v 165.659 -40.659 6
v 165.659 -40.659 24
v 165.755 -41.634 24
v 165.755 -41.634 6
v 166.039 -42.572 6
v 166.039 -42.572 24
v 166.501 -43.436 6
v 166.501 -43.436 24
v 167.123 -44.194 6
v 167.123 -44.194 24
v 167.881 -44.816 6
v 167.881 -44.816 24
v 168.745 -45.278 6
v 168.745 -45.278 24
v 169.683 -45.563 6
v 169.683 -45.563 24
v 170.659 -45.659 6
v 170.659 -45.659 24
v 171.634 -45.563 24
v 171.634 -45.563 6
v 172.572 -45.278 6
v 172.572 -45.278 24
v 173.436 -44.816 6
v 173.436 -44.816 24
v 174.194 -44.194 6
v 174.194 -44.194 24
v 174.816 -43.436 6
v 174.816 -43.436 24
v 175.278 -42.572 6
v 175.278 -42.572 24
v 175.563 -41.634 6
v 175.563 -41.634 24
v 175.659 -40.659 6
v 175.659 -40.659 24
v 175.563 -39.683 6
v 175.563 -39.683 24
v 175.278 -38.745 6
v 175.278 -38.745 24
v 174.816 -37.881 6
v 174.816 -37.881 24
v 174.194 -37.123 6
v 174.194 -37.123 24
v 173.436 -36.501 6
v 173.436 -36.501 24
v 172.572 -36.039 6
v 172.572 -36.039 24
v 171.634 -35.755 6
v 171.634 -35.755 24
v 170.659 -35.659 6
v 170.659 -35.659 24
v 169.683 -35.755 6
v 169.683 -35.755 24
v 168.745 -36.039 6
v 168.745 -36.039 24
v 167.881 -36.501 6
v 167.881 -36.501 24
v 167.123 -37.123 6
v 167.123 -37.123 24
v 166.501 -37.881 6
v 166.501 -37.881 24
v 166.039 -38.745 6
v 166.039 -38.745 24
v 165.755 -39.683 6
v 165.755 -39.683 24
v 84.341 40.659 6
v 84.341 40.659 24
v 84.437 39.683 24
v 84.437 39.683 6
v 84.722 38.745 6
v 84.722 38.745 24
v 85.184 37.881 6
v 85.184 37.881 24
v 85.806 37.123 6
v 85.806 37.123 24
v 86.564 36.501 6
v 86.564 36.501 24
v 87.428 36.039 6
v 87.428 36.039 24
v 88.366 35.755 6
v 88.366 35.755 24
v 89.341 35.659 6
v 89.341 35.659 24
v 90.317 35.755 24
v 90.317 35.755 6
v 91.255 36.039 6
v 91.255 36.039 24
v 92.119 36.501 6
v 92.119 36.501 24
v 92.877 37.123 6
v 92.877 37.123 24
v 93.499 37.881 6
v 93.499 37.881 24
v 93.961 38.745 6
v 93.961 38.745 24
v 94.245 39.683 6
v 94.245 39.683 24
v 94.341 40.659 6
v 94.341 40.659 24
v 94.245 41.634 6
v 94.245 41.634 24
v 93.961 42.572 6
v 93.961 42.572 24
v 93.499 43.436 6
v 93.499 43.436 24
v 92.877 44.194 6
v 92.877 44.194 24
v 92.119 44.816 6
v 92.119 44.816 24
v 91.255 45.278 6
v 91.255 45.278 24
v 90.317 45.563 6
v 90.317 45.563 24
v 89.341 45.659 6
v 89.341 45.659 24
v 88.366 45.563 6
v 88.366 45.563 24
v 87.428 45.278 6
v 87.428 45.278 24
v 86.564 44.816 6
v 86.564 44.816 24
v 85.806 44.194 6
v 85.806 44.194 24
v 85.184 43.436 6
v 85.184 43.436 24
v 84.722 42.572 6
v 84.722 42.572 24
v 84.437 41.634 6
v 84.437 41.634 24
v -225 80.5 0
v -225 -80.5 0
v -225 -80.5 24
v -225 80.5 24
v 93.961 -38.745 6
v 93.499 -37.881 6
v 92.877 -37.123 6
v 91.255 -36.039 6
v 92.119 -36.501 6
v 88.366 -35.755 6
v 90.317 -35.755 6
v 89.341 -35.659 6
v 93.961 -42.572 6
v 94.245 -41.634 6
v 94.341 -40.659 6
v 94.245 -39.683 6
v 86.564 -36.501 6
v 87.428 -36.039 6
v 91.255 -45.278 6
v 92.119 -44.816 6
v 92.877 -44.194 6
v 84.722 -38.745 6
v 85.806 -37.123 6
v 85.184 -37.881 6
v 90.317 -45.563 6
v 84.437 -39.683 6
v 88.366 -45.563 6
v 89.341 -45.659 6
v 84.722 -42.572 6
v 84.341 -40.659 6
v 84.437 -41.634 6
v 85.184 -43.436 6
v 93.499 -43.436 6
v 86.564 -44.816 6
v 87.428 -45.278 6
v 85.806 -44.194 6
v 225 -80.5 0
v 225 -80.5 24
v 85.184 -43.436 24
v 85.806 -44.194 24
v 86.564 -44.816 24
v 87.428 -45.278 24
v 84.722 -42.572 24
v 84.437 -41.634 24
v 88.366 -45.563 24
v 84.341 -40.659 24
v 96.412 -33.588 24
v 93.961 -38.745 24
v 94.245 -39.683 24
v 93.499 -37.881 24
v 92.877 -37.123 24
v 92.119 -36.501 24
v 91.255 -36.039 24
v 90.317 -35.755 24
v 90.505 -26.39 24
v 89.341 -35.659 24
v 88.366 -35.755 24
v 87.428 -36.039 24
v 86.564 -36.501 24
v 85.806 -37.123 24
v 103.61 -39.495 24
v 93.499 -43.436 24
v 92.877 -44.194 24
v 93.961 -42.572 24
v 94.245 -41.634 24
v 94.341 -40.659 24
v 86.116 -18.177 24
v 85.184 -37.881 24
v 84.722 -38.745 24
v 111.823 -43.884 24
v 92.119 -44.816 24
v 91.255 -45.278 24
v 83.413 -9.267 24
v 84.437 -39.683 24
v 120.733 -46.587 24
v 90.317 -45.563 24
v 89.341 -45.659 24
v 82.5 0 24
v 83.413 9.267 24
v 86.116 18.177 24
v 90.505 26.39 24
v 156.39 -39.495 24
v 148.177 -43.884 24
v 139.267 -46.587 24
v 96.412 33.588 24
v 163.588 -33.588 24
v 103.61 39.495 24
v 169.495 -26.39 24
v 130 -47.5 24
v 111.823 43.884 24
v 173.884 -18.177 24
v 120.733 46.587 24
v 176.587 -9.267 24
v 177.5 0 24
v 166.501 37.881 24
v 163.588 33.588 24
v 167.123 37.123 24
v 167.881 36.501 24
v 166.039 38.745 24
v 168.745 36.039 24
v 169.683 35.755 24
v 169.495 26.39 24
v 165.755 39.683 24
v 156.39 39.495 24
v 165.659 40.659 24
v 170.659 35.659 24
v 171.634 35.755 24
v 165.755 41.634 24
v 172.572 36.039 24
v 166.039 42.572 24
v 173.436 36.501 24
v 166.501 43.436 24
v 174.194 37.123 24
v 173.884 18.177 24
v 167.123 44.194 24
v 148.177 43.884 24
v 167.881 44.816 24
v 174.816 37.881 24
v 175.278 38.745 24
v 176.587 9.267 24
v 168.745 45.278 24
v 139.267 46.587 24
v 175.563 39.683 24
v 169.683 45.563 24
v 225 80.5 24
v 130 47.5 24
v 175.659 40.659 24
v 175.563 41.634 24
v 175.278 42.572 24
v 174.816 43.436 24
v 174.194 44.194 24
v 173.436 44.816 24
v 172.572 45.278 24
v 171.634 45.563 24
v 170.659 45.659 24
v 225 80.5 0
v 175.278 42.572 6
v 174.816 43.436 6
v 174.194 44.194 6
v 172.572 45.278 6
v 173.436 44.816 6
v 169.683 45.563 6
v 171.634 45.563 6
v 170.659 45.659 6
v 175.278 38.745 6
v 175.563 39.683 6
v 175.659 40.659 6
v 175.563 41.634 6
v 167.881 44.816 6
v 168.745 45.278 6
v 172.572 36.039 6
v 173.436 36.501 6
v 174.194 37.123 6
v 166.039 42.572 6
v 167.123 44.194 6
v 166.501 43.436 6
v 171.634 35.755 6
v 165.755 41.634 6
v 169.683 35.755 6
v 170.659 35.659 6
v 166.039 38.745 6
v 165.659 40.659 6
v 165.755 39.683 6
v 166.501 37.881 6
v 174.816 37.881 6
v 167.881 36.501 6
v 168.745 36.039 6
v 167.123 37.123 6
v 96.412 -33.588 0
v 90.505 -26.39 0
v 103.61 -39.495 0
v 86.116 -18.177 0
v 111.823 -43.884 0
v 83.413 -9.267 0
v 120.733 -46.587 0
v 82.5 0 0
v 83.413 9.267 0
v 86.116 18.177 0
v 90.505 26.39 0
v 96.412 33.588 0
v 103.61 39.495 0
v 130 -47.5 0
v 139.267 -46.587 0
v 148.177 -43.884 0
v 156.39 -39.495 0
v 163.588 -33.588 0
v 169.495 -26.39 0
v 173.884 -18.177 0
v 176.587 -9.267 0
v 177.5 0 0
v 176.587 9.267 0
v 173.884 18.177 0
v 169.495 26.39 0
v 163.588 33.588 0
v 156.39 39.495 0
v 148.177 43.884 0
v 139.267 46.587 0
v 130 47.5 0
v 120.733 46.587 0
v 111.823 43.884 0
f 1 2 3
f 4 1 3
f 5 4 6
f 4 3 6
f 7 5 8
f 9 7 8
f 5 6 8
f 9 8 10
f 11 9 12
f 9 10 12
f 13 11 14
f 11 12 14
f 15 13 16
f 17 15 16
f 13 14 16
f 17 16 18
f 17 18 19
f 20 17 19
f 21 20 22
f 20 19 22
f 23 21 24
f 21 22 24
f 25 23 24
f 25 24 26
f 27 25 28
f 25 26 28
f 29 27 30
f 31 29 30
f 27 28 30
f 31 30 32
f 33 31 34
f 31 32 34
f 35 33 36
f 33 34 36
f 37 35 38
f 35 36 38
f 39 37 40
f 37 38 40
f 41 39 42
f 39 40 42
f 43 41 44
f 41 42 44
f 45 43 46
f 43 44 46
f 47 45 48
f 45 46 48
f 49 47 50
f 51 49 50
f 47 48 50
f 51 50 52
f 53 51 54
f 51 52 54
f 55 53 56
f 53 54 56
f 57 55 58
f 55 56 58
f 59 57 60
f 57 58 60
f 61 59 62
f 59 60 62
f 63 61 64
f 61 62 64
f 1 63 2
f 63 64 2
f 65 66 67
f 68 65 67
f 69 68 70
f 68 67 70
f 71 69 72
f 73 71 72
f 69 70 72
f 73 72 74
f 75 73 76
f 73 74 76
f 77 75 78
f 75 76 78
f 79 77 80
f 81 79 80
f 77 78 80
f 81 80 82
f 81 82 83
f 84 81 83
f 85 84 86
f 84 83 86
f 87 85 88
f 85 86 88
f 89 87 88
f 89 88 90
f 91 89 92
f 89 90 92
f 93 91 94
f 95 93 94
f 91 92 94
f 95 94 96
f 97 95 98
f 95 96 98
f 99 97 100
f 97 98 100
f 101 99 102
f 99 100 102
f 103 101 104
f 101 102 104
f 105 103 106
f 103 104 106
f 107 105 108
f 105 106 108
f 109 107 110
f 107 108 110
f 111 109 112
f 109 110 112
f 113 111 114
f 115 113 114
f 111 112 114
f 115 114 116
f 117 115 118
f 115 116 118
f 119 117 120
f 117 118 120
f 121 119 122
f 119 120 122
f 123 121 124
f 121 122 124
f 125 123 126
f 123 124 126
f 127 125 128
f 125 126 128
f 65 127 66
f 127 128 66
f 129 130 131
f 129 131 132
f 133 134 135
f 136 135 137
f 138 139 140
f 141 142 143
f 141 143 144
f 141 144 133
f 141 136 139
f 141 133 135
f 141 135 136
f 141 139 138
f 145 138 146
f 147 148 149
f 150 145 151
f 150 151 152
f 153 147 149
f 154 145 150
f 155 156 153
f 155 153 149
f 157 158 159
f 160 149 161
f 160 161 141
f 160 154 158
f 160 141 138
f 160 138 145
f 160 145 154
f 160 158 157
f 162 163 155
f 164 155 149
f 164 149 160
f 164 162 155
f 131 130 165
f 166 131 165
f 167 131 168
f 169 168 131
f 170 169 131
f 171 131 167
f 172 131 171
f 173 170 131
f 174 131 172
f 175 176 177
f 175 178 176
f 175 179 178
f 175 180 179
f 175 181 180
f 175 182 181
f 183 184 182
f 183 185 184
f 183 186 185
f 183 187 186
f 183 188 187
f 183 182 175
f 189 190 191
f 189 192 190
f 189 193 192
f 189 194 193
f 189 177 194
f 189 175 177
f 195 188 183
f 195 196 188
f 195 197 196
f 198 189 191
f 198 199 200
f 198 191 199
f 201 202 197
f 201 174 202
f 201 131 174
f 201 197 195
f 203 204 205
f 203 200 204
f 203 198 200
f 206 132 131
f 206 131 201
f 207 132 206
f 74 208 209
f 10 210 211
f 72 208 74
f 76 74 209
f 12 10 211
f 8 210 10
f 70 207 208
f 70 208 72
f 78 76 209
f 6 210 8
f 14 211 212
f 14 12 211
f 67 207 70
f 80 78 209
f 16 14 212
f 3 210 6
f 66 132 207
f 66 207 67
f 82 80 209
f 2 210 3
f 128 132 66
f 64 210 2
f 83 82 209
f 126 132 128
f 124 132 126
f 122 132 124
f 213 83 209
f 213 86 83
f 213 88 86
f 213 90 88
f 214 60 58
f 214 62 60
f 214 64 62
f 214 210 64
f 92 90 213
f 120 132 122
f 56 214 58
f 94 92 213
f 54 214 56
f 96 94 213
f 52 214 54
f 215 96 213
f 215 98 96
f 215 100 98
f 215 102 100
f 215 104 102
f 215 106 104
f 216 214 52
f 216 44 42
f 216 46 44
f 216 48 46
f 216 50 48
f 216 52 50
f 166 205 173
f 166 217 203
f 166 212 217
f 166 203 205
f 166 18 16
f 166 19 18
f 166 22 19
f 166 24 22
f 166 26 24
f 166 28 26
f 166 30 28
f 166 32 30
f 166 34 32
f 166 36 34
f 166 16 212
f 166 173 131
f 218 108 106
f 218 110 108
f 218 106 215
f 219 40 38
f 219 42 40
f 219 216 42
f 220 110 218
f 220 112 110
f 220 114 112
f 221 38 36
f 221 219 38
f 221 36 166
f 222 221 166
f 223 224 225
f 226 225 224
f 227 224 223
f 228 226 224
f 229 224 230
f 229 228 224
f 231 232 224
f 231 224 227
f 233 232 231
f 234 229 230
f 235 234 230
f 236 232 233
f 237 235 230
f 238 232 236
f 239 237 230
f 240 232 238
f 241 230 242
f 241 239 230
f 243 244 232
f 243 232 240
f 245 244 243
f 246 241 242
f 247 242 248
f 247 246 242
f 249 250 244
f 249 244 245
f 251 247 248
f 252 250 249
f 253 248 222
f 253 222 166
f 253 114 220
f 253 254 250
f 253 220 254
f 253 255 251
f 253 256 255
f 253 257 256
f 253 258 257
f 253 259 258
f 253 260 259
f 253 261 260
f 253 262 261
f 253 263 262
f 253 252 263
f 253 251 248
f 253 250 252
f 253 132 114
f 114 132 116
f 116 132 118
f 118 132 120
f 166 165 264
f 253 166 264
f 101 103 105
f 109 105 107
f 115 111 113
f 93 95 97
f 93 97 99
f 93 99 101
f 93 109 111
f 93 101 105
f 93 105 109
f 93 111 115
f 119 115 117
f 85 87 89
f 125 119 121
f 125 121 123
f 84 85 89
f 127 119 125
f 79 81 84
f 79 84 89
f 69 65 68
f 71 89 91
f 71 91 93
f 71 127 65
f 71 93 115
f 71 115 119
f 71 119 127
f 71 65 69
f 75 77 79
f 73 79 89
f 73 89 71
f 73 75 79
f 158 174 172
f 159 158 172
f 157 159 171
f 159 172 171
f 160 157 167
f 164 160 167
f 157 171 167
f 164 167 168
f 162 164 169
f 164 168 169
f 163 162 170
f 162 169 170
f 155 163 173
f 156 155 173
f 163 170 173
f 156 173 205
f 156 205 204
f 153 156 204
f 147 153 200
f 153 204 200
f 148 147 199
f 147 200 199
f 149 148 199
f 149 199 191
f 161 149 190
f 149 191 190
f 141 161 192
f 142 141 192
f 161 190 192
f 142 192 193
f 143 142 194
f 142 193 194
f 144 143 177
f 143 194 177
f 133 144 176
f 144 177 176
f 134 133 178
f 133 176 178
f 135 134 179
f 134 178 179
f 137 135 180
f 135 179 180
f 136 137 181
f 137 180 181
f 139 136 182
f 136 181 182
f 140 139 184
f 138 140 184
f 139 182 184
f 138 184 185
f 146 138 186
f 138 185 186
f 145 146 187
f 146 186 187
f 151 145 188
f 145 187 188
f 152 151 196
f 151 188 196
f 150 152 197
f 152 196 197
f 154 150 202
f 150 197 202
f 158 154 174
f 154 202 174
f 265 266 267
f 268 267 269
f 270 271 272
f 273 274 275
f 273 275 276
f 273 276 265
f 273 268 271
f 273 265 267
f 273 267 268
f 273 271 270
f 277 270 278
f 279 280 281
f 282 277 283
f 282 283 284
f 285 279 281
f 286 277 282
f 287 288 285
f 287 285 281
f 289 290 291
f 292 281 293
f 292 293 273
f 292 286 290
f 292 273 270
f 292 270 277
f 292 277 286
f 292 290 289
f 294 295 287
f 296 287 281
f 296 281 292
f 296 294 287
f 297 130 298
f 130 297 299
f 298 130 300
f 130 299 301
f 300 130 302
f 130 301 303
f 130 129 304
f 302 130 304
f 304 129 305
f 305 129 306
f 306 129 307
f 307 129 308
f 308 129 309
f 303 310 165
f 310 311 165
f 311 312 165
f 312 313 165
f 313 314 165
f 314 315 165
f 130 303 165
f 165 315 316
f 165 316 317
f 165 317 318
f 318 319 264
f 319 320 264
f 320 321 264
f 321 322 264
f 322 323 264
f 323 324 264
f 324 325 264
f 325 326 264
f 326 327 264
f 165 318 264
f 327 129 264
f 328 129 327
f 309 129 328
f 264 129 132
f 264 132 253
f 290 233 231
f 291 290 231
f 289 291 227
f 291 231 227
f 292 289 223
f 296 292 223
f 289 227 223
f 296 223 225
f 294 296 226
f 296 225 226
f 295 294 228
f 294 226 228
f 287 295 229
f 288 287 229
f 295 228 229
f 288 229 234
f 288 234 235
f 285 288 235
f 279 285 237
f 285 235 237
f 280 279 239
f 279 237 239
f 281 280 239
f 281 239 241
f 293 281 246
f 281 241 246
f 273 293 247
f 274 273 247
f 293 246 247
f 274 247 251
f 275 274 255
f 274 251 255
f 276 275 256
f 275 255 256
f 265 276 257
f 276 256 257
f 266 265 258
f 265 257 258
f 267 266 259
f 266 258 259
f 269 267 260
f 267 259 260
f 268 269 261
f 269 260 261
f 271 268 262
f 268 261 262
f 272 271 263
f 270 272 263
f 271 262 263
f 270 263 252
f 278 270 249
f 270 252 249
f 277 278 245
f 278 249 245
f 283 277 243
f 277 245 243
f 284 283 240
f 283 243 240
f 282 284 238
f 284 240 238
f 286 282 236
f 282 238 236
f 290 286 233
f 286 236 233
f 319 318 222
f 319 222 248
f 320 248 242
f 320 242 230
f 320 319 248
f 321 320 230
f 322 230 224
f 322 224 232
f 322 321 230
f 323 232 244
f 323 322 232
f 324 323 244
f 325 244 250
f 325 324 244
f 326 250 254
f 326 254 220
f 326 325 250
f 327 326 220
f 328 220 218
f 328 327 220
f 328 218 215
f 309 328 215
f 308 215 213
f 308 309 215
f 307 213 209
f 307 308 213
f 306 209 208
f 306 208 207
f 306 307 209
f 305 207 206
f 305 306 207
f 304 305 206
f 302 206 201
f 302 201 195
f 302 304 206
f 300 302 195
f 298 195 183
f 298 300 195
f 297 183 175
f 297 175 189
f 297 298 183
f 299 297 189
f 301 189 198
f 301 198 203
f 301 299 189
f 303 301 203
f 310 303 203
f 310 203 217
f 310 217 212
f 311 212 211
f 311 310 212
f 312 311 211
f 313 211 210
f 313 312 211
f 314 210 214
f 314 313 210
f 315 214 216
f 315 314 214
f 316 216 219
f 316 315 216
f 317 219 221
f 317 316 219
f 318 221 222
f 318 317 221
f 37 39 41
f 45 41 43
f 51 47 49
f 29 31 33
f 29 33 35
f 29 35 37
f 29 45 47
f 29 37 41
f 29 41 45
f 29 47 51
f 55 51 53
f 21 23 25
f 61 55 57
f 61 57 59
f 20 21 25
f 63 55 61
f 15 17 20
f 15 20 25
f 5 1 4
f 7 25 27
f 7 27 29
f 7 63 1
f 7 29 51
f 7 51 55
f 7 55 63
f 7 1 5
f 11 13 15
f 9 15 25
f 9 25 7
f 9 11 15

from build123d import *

# Parameters (mm, degrees)
SKETCH_1_W          = 450
SKETCH_1_H          = 161
SKETCH_1_R          = 47.5
EXTRUDE_1_DEPTH     = 24
CUT_EXTRUDE_START   = 24
SKETCH_1_3_R        = 5
CUT_EXTRUDE_1_DEPTH = 18


with BuildPart() as part:
    # 草图1 → 凸台-拉伸1 (new body)
    with BuildSketch(Plane.XY):
        Rectangle(SKETCH_1_W, SKETCH_1_H)
        with Locations((130, 0)):
            Circle(SKETCH_1_R, mode=Mode.SUBTRACT)
    extrude(amount=EXTRUDE_1_DEPTH)

    # 草图1<3> → 切除-拉伸1 (cut)
    with BuildSketch(Plane.XY.offset(CUT_EXTRUDE_START)):
        with Locations(Location((89.341360082, 40.658639918, 0), (0, 0, 180))):
            Circle(SKETCH_1_3_R)
        with Locations(Location((170.658639918, 40.658639918, 0), (0, 0, 180))):
            Circle(SKETCH_1_3_R)
        with Locations(Location((170.658639918, -40.658639918, 0), (0, 0, 180))):
            Circle(SKETCH_1_3_R)
        with Locations(Location((89.341360082, -40.658639918, 0), (0, 0, 180))):
            Circle(SKETCH_1_3_R)
    extrude(amount=-CUT_EXTRUDE_1_DEPTH, mode=Mode.SUBTRACT)


solid = part.part
